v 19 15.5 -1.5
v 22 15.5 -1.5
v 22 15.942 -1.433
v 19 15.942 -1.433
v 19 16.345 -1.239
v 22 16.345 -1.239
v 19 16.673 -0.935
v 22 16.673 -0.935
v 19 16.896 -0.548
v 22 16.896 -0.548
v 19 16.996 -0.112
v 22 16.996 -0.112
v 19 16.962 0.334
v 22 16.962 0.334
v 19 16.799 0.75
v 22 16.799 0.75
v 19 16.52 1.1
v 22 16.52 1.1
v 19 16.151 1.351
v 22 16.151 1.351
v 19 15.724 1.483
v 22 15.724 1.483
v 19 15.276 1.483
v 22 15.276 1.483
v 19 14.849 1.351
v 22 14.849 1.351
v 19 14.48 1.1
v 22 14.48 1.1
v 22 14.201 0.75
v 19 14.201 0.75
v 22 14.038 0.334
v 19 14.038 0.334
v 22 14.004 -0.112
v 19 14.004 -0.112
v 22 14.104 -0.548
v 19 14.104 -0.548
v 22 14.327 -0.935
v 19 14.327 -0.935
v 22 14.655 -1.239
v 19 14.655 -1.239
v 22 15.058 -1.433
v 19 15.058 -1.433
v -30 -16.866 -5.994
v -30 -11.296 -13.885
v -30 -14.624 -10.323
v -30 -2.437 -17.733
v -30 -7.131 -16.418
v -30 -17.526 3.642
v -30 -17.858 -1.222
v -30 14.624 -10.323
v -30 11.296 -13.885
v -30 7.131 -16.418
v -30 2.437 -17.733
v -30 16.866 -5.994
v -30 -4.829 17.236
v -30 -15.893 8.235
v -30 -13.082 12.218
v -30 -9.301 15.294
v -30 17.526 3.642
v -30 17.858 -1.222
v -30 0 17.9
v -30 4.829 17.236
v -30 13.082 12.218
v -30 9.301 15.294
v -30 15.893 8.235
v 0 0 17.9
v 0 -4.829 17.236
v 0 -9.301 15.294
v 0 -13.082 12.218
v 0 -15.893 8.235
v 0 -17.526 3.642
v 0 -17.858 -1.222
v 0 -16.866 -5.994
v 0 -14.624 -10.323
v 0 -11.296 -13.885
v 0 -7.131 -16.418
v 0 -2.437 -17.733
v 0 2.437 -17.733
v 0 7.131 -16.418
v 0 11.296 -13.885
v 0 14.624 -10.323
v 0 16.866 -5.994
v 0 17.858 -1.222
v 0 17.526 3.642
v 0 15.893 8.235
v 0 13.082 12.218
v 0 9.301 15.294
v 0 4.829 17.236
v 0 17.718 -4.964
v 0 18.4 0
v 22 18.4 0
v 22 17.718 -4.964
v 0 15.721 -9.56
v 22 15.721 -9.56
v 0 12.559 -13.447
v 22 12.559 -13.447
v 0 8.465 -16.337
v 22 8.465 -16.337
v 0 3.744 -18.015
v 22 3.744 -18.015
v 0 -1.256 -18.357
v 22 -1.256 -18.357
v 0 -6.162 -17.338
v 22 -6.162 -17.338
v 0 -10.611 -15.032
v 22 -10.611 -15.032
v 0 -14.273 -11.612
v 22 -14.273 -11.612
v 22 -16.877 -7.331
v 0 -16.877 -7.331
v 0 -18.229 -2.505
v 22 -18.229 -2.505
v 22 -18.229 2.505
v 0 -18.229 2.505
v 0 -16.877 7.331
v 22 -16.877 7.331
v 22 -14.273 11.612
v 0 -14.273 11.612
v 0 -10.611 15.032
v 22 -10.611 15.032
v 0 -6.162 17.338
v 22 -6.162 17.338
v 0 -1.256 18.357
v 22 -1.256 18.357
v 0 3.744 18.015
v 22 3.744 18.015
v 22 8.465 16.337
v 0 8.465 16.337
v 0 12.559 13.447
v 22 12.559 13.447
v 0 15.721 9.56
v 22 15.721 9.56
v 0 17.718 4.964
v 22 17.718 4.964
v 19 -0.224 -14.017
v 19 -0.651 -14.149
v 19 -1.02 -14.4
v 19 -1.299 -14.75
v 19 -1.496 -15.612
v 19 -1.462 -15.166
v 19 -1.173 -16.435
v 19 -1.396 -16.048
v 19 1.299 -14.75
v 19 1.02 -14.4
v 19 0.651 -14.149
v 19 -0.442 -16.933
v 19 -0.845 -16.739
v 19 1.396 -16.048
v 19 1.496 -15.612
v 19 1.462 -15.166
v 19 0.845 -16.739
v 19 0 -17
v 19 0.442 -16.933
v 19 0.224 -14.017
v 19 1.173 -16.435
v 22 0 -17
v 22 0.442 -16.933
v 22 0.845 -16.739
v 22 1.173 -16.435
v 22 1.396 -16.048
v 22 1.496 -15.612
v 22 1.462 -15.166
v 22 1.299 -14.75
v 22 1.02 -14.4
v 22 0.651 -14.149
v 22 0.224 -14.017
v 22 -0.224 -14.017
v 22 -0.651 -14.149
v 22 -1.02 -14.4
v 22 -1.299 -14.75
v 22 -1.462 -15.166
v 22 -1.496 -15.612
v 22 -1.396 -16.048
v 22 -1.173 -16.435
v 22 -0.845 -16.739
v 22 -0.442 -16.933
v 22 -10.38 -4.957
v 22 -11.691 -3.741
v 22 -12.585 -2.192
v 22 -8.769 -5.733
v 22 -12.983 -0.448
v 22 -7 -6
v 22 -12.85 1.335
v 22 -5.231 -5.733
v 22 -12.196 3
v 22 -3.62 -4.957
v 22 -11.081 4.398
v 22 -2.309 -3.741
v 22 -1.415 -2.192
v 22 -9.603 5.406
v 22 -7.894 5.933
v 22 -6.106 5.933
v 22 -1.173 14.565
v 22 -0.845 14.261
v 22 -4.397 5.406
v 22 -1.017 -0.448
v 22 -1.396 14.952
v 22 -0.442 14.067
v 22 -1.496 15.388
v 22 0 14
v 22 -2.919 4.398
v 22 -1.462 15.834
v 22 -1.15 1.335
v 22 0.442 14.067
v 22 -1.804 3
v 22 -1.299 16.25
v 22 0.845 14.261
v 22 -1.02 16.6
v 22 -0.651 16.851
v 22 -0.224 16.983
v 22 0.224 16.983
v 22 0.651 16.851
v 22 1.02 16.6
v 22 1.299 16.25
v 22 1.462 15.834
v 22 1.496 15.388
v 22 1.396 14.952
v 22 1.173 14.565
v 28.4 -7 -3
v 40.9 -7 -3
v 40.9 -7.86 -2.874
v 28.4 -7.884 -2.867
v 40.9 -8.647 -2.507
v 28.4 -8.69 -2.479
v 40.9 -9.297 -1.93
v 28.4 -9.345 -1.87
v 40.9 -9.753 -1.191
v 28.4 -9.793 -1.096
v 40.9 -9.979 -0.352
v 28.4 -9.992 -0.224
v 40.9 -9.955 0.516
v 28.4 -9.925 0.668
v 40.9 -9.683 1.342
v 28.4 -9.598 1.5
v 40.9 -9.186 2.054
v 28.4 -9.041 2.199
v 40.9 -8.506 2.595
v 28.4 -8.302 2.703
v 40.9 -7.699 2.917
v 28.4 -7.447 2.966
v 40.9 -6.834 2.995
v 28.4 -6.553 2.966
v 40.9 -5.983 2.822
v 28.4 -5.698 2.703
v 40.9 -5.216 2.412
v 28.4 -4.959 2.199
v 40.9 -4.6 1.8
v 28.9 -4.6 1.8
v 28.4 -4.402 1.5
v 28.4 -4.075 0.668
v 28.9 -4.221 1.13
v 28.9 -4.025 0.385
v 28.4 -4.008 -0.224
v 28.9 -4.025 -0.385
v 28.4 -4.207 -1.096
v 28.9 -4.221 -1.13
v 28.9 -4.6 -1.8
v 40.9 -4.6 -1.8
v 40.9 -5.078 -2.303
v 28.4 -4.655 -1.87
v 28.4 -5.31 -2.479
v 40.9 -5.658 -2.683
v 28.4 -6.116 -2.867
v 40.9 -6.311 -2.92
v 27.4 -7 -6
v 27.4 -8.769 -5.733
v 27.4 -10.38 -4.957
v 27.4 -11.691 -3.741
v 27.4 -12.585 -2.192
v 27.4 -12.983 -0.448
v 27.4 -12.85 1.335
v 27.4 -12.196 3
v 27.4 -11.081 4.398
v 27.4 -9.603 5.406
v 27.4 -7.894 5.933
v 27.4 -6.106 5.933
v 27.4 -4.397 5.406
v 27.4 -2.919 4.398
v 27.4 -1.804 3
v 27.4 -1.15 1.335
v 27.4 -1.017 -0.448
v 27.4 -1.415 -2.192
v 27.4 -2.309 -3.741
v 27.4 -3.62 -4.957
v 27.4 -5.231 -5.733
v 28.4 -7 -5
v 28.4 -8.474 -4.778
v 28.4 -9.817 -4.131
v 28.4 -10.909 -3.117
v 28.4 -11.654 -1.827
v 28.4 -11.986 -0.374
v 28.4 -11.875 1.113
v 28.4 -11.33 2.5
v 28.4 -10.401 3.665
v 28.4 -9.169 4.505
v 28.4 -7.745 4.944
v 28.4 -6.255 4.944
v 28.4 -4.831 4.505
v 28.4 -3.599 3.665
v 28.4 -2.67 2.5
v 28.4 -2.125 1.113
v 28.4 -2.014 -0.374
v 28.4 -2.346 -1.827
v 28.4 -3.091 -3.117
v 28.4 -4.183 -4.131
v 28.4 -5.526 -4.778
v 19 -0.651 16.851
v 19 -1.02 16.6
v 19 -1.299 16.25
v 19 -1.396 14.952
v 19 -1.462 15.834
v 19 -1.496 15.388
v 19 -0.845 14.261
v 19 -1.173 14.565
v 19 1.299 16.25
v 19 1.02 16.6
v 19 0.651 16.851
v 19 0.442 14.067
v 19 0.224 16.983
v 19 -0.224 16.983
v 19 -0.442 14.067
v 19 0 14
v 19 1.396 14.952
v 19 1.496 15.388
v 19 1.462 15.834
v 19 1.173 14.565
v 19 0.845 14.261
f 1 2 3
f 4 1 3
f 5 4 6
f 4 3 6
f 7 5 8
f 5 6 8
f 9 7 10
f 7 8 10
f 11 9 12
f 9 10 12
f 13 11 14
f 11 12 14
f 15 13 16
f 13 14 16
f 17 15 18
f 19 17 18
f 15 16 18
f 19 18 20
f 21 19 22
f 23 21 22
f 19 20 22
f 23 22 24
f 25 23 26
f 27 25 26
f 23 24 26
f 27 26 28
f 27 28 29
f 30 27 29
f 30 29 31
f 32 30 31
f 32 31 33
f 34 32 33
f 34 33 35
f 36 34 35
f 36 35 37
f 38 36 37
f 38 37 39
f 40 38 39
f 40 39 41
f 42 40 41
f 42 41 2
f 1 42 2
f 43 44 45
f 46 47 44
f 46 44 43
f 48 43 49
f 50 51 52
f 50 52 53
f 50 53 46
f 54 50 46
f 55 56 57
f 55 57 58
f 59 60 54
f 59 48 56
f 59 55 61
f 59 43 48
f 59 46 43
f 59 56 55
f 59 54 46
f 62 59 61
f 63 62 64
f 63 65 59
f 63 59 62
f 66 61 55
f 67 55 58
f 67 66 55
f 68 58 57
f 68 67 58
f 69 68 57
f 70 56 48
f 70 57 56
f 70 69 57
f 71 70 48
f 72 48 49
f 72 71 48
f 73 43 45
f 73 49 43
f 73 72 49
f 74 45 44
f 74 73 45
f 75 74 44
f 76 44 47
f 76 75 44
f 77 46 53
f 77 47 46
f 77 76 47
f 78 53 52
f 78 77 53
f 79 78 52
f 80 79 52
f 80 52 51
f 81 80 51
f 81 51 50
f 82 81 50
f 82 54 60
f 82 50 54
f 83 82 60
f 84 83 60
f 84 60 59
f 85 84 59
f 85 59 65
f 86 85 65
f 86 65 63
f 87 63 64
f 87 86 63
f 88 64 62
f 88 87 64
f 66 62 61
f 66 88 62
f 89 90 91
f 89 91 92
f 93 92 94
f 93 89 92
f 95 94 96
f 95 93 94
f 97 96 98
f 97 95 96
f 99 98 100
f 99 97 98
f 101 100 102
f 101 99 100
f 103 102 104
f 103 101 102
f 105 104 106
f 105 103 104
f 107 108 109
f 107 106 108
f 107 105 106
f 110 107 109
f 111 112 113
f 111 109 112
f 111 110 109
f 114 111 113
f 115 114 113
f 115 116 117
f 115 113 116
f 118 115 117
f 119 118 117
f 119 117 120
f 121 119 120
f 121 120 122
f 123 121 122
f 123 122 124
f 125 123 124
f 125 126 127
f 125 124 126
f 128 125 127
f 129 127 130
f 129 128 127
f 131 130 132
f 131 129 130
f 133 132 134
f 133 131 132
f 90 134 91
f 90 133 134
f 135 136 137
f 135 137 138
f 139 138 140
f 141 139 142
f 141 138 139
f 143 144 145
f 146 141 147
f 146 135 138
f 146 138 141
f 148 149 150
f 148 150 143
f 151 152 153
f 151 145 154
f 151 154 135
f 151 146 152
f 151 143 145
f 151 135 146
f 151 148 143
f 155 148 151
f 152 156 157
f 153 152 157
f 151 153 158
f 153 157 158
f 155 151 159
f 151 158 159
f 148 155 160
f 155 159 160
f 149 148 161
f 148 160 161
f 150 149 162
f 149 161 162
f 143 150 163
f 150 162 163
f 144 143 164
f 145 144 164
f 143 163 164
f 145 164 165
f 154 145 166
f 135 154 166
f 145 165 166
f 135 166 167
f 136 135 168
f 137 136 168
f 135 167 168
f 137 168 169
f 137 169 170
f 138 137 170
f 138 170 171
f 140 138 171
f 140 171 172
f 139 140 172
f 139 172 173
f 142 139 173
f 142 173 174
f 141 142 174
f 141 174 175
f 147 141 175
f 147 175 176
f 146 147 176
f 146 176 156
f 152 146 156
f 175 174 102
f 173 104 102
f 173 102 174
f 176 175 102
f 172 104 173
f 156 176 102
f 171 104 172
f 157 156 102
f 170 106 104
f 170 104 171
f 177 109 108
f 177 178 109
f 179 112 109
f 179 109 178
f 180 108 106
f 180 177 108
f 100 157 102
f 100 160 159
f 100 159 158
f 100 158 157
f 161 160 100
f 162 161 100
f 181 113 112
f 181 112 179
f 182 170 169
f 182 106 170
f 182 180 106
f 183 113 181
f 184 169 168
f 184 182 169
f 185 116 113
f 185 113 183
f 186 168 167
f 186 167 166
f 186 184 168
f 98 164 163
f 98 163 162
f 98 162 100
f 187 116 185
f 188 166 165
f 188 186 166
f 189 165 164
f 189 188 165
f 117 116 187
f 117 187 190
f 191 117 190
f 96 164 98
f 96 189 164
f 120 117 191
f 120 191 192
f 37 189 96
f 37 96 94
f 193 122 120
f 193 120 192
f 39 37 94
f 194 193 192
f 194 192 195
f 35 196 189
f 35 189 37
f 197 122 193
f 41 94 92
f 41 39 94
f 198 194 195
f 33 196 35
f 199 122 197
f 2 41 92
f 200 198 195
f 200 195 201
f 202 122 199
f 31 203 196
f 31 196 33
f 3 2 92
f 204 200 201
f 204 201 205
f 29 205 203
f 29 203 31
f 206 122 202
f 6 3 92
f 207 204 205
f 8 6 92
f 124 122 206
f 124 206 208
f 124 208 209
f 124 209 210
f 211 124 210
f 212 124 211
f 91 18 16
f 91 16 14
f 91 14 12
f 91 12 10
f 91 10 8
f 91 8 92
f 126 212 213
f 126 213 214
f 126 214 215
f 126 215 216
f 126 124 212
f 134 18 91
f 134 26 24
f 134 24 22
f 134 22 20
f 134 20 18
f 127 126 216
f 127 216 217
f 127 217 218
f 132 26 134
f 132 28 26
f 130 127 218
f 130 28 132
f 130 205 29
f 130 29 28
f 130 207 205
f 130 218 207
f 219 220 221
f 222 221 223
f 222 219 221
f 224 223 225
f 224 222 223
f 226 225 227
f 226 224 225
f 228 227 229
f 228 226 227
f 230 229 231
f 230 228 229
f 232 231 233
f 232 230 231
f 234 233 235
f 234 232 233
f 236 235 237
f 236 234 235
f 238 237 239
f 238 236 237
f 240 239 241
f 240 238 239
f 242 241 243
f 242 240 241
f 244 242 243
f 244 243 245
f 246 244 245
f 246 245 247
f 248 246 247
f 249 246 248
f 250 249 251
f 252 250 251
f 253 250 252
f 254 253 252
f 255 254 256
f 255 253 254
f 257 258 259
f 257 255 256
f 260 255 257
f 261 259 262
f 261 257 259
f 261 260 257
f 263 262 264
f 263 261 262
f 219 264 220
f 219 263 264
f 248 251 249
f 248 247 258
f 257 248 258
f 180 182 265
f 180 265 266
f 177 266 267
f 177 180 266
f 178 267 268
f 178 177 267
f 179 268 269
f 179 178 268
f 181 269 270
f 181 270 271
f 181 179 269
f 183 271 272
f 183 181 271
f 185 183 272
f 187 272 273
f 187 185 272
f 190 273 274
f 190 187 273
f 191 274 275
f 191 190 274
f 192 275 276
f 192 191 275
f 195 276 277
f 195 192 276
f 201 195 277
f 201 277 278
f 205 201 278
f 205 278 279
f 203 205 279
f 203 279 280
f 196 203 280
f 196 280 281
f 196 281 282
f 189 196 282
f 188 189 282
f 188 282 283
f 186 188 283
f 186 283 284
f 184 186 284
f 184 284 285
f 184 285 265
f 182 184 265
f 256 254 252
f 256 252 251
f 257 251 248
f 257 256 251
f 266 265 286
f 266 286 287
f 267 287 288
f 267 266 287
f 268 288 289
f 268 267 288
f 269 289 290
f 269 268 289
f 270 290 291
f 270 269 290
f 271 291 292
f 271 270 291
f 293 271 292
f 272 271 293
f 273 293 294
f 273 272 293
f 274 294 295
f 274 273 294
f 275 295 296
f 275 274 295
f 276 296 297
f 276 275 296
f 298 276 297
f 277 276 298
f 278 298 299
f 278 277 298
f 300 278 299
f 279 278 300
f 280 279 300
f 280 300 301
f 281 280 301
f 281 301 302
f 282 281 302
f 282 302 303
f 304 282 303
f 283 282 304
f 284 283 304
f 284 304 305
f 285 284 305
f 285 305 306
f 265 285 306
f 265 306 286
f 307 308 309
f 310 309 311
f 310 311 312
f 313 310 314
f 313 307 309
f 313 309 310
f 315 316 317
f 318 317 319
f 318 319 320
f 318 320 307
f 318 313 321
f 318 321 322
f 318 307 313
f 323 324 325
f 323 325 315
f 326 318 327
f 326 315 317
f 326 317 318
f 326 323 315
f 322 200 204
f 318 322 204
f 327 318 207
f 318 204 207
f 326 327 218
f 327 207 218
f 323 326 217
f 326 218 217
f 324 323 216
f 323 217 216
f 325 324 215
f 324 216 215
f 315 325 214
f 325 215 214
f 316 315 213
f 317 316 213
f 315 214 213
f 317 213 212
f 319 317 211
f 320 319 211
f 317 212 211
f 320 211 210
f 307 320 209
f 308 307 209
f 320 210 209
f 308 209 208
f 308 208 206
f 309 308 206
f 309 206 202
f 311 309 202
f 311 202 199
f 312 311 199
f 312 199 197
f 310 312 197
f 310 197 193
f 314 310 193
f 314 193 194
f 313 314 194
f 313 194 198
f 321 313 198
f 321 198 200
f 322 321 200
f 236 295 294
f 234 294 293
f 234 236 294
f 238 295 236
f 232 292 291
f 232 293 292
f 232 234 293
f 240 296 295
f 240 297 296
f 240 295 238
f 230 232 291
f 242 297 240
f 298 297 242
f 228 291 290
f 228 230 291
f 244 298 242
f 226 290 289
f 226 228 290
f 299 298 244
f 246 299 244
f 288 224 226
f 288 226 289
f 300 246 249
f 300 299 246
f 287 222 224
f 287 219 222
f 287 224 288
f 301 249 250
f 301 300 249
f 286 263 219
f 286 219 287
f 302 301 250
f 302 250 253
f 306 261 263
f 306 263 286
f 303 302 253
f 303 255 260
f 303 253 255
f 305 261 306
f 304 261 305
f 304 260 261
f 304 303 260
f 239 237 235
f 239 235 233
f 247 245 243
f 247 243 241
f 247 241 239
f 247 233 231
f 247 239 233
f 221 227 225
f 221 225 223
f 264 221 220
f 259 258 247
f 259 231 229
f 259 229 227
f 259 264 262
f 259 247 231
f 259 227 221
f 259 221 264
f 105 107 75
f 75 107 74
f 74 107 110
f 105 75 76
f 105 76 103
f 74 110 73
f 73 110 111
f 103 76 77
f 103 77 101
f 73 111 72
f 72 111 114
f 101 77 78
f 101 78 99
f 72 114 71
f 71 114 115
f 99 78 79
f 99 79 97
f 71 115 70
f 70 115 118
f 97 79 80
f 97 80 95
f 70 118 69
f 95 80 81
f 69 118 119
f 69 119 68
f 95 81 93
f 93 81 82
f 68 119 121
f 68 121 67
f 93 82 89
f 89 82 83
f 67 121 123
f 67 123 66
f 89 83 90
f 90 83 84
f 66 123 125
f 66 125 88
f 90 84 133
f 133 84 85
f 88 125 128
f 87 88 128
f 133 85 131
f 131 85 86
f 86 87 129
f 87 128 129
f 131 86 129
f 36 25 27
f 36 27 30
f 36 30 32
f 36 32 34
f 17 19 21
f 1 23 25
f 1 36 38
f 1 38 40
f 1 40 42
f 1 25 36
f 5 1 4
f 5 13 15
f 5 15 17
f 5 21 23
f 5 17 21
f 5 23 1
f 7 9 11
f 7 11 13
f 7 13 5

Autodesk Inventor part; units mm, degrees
ref_plane "YZ Plane" through (0, 0, 0) normal (1, 0, 0) x (0, 1, 0)
ref_plane "XZ Plane" through (0, 0, 0) normal (0, 1, 0) x (-1, 0, 0)
ref_plane "XY Plane" through (0, 0, 0) normal (0, 0, 1) x (1, 0, 0)
sketch "Sketch1" plane through (0, 0, 0) normal (1, 0, 0) x (0, 1, 0)
  point P0 (0, 0)
sketch "Sketch2" plane through (0, 0, 0) normal (1, 0, 0) x (0, 1, 0)
  circle A0 centre (0, 0) radius 18.4
  dimension "d0" = 36.8
extrude "Extrusion1" add sketch "Sketch2" along normal blind 22
sketch "Sketch3" plane through (22, 0, 0) normal (1, 0, 0) x (0, 0, -1)
  line L0 (0, 0) -> (0, -7)
  circle A0 centre (0, -7) radius 6
  dimension "d3" = 7
  dimension "d4" = 12
extrude "Extrusion2" add sketch "Sketch3" along normal blind 6.4
chamfer "Chamfer1" distance 1 angle 45 1 edges at (28.4, -7, 6)
sketch "Sketch4" plane through (28.4, -7, 0) normal (1, 0, 0) x (0, 0, -1)
  circle A0 centre (0, 0) radius 5 projected
  circle A1 centre (0, 0) radius 3
  point P0 (0, 7)
  dimension "d10" = 6
extrude "Extrusion3" add sketch "Sketch4" along normal blind 12.5 contours A1
sketch "Sketch5" plane through (40.9, -7, 0) normal (1, 0, 0) x (0, 0, -1)
  circle A0 centre (0, 0) radius 3 projected
  line L0 (0, -3) -> (0, 2.4)
  line L1 (0, 2.4) -> (1.8, 2.4)
  line L2 (-1.8, 2.4) -> (0, 2.4)
  point P0 (0, 7)
  dimension "d13" = 5.4
extrude "Extrusion4" cut sketch "Sketch5" against normal blind 12 contours L1 L2 A0
sketch "Sketch6" plane through (0, 0, 0) normal (-1, 0, 0) x (0, 0, 1)
  circle A0 centre (0, 0) radius 17.9
  dimension "d16" = 35.8
extrude "Extrusion5" add sketch "Sketch6" along normal blind 30
sketch "Sketch9" plane through (22, 0, 0) normal (1, 0, 0) x (0, 0, -1)
  circle A0 centre (0, 0) radius 15.5
  circle A1 centre (0, 15.5) radius 1.5
  circle A2 centre (15.5, 0) radius 1.5
  circle A3 centre (-15.5, 0) radius 1.5
  dimension "d19" = 31
  dimension "d20" = 3
  dimension "d21" = 3
  dimension "d22" = 3
extrude "Extrusion6" cut sketch "Sketch9" against normal blind 3 contours A0 A2 | A0 A2 | A1 A0 | A0 A1 | A3 A0 | A0 A3
properties part number "motor"
